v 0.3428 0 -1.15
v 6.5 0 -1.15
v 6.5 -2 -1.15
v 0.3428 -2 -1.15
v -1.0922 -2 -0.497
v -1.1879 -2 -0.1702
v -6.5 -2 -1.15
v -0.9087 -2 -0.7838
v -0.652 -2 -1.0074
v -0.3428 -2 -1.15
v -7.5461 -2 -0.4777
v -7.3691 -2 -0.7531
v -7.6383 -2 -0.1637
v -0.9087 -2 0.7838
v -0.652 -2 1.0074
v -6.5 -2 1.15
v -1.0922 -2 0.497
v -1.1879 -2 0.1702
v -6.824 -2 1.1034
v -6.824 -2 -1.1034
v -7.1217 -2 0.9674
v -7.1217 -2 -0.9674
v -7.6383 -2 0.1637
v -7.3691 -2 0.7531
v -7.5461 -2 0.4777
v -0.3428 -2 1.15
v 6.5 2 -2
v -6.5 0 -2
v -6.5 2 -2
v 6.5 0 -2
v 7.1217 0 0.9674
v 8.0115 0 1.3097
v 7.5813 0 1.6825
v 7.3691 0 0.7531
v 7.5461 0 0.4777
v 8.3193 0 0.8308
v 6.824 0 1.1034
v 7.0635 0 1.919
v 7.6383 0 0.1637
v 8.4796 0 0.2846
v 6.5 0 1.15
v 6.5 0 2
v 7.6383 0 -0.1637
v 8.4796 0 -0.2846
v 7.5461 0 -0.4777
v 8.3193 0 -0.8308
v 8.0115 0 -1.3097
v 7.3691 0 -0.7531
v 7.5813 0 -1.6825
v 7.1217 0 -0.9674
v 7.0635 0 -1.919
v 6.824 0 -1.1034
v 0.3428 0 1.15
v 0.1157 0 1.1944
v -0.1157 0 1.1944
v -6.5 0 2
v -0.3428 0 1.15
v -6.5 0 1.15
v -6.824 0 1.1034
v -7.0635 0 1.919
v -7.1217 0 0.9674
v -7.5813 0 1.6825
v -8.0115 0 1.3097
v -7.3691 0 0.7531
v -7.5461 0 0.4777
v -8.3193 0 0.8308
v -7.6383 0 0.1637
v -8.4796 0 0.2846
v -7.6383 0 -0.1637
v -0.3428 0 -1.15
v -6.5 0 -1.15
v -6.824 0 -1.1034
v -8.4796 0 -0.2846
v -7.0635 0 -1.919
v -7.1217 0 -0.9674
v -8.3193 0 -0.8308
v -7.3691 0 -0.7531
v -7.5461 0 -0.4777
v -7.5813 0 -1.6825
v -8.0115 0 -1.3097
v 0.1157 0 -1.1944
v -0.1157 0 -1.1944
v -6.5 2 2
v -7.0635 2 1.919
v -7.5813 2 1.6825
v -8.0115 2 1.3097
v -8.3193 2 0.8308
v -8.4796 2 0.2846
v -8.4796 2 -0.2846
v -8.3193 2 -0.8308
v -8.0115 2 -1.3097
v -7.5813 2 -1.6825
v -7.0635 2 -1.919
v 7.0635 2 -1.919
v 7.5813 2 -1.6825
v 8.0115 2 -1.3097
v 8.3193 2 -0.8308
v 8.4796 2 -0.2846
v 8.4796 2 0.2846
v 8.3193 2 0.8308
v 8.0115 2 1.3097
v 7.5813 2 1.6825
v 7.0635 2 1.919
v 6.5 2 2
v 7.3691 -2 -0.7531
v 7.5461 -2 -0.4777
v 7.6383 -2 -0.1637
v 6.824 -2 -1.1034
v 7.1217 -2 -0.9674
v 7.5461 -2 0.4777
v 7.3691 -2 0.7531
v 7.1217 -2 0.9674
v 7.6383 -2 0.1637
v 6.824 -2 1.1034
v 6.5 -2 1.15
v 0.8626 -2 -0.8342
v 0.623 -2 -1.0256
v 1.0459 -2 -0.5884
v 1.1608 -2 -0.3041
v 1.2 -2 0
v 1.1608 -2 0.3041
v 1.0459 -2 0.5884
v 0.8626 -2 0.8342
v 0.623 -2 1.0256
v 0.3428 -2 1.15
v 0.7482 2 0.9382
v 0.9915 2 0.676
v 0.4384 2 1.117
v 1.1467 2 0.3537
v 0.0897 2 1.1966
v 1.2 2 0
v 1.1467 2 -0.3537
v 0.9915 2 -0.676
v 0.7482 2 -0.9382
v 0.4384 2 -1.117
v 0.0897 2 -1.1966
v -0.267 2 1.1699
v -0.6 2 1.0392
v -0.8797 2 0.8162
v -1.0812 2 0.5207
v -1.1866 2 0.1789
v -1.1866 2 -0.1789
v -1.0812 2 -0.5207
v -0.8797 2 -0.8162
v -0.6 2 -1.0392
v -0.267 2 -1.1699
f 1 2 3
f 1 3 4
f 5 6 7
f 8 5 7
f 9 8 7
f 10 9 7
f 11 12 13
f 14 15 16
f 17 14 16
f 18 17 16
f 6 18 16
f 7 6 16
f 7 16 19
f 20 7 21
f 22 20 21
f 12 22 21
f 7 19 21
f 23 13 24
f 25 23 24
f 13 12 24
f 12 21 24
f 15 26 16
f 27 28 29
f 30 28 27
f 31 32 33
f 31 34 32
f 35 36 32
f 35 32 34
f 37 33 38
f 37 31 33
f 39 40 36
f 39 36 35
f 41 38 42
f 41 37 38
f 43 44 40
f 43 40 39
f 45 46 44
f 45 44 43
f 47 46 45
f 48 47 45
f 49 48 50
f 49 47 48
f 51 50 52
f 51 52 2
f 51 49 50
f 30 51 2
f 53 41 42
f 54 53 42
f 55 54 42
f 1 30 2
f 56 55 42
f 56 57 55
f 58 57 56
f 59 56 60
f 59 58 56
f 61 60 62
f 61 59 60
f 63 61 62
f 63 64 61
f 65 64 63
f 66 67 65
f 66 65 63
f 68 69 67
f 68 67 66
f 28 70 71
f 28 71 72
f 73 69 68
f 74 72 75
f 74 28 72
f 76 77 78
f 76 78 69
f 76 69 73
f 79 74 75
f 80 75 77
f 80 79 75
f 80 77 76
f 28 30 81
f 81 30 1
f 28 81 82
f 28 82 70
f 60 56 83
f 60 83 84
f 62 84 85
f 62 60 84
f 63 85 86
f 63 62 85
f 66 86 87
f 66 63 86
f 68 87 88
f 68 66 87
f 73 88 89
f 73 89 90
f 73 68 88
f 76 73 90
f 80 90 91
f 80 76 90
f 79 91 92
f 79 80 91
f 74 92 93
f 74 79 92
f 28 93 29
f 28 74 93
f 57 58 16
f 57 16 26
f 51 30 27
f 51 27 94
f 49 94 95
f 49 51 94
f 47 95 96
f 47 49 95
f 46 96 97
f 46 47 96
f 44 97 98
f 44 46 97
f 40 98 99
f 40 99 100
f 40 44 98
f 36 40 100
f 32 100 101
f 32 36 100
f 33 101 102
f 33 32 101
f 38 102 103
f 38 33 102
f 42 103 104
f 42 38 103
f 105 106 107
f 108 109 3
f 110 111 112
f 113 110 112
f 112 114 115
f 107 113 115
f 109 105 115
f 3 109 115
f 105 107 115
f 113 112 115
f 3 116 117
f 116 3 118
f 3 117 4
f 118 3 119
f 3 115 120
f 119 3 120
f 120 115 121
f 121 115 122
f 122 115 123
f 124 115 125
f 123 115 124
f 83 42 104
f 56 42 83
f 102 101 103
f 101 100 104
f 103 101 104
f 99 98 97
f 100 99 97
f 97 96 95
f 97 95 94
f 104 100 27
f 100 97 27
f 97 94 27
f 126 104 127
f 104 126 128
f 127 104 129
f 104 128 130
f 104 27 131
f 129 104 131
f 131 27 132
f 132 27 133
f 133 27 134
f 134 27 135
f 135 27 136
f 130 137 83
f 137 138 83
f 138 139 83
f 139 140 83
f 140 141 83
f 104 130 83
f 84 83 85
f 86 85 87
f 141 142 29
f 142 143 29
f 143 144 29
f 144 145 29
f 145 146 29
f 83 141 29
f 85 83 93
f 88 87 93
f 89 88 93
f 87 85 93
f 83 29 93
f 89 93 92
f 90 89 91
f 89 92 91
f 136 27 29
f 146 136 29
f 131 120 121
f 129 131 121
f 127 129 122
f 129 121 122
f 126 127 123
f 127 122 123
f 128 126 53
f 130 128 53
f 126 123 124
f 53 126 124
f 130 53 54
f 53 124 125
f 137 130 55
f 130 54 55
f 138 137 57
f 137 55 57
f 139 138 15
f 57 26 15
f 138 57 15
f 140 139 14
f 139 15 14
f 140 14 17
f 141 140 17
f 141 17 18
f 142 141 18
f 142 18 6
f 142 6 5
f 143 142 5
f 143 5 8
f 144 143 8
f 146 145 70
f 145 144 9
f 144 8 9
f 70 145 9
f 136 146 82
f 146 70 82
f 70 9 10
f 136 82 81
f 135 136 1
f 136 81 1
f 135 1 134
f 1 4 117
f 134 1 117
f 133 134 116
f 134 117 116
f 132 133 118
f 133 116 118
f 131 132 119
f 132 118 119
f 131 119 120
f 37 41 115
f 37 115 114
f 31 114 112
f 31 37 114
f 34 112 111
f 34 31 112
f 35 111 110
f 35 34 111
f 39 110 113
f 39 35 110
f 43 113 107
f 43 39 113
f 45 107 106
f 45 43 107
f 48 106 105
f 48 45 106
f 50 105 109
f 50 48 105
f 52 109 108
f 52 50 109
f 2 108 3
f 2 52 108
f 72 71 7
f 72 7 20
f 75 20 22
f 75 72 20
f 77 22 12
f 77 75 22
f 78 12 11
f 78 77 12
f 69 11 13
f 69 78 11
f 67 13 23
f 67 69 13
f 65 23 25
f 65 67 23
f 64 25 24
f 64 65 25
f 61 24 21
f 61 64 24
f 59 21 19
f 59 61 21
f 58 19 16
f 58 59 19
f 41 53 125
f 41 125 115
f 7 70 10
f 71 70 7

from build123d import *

# Parameters (mm, degrees)
BOSS_EXTRUDE1_DEPTH = 2
BOSS_EXTRUDE2_DEPTH = 2
SKETCH3_R           = 1.2
CUT_EXTRUDE1_DEPTH  = 5


with BuildPart() as part:
    # Sketch1 → Boss-Extrude1 (new body)
    with BuildSketch(Plane(origin=(0, 0, 0), x_dir=(1, 0, 0), z_dir=(0, 1, 0))):
        with BuildLine():
            Line((-6.5, 2), (6.5, 2))
            ThreePointArc((6.5, 2), (8.5, 0), (6.5, -2))
            Line((6.5, -2), (-6.5, -2))
            ThreePointArc((-6.5, -2), (-8.5, 0), (-6.5, 2))
        make_face()
    extrude(amount=BOSS_EXTRUDE1_DEPTH)

    # Sketch2 → Boss-Extrude2 (add)
    with BuildSketch(Plane.XZ):
        with BuildLine():
            Line((-6.5, 1.15), (6.5, 1.15))
            ThreePointArc((6.5, 1.15), (7.65, 0), (6.5, -1.15))
            Line((6.5, -1.15), (-6.5, -1.15))
            ThreePointArc((-6.5, -1.15), (-7.65, 0), (-6.5, 1.15))
        make_face()
    extrude(amount=BOSS_EXTRUDE2_DEPTH)

    # Sketch3 → Cut-Extrude1 (cut, through all)
    with BuildSketch(Plane.XZ.offset(2)):
        Circle(SKETCH3_R)
    extrude(amount=-CUT_EXTRUDE1_DEPTH, mode=Mode.SUBTRACT)


solid = part.part
